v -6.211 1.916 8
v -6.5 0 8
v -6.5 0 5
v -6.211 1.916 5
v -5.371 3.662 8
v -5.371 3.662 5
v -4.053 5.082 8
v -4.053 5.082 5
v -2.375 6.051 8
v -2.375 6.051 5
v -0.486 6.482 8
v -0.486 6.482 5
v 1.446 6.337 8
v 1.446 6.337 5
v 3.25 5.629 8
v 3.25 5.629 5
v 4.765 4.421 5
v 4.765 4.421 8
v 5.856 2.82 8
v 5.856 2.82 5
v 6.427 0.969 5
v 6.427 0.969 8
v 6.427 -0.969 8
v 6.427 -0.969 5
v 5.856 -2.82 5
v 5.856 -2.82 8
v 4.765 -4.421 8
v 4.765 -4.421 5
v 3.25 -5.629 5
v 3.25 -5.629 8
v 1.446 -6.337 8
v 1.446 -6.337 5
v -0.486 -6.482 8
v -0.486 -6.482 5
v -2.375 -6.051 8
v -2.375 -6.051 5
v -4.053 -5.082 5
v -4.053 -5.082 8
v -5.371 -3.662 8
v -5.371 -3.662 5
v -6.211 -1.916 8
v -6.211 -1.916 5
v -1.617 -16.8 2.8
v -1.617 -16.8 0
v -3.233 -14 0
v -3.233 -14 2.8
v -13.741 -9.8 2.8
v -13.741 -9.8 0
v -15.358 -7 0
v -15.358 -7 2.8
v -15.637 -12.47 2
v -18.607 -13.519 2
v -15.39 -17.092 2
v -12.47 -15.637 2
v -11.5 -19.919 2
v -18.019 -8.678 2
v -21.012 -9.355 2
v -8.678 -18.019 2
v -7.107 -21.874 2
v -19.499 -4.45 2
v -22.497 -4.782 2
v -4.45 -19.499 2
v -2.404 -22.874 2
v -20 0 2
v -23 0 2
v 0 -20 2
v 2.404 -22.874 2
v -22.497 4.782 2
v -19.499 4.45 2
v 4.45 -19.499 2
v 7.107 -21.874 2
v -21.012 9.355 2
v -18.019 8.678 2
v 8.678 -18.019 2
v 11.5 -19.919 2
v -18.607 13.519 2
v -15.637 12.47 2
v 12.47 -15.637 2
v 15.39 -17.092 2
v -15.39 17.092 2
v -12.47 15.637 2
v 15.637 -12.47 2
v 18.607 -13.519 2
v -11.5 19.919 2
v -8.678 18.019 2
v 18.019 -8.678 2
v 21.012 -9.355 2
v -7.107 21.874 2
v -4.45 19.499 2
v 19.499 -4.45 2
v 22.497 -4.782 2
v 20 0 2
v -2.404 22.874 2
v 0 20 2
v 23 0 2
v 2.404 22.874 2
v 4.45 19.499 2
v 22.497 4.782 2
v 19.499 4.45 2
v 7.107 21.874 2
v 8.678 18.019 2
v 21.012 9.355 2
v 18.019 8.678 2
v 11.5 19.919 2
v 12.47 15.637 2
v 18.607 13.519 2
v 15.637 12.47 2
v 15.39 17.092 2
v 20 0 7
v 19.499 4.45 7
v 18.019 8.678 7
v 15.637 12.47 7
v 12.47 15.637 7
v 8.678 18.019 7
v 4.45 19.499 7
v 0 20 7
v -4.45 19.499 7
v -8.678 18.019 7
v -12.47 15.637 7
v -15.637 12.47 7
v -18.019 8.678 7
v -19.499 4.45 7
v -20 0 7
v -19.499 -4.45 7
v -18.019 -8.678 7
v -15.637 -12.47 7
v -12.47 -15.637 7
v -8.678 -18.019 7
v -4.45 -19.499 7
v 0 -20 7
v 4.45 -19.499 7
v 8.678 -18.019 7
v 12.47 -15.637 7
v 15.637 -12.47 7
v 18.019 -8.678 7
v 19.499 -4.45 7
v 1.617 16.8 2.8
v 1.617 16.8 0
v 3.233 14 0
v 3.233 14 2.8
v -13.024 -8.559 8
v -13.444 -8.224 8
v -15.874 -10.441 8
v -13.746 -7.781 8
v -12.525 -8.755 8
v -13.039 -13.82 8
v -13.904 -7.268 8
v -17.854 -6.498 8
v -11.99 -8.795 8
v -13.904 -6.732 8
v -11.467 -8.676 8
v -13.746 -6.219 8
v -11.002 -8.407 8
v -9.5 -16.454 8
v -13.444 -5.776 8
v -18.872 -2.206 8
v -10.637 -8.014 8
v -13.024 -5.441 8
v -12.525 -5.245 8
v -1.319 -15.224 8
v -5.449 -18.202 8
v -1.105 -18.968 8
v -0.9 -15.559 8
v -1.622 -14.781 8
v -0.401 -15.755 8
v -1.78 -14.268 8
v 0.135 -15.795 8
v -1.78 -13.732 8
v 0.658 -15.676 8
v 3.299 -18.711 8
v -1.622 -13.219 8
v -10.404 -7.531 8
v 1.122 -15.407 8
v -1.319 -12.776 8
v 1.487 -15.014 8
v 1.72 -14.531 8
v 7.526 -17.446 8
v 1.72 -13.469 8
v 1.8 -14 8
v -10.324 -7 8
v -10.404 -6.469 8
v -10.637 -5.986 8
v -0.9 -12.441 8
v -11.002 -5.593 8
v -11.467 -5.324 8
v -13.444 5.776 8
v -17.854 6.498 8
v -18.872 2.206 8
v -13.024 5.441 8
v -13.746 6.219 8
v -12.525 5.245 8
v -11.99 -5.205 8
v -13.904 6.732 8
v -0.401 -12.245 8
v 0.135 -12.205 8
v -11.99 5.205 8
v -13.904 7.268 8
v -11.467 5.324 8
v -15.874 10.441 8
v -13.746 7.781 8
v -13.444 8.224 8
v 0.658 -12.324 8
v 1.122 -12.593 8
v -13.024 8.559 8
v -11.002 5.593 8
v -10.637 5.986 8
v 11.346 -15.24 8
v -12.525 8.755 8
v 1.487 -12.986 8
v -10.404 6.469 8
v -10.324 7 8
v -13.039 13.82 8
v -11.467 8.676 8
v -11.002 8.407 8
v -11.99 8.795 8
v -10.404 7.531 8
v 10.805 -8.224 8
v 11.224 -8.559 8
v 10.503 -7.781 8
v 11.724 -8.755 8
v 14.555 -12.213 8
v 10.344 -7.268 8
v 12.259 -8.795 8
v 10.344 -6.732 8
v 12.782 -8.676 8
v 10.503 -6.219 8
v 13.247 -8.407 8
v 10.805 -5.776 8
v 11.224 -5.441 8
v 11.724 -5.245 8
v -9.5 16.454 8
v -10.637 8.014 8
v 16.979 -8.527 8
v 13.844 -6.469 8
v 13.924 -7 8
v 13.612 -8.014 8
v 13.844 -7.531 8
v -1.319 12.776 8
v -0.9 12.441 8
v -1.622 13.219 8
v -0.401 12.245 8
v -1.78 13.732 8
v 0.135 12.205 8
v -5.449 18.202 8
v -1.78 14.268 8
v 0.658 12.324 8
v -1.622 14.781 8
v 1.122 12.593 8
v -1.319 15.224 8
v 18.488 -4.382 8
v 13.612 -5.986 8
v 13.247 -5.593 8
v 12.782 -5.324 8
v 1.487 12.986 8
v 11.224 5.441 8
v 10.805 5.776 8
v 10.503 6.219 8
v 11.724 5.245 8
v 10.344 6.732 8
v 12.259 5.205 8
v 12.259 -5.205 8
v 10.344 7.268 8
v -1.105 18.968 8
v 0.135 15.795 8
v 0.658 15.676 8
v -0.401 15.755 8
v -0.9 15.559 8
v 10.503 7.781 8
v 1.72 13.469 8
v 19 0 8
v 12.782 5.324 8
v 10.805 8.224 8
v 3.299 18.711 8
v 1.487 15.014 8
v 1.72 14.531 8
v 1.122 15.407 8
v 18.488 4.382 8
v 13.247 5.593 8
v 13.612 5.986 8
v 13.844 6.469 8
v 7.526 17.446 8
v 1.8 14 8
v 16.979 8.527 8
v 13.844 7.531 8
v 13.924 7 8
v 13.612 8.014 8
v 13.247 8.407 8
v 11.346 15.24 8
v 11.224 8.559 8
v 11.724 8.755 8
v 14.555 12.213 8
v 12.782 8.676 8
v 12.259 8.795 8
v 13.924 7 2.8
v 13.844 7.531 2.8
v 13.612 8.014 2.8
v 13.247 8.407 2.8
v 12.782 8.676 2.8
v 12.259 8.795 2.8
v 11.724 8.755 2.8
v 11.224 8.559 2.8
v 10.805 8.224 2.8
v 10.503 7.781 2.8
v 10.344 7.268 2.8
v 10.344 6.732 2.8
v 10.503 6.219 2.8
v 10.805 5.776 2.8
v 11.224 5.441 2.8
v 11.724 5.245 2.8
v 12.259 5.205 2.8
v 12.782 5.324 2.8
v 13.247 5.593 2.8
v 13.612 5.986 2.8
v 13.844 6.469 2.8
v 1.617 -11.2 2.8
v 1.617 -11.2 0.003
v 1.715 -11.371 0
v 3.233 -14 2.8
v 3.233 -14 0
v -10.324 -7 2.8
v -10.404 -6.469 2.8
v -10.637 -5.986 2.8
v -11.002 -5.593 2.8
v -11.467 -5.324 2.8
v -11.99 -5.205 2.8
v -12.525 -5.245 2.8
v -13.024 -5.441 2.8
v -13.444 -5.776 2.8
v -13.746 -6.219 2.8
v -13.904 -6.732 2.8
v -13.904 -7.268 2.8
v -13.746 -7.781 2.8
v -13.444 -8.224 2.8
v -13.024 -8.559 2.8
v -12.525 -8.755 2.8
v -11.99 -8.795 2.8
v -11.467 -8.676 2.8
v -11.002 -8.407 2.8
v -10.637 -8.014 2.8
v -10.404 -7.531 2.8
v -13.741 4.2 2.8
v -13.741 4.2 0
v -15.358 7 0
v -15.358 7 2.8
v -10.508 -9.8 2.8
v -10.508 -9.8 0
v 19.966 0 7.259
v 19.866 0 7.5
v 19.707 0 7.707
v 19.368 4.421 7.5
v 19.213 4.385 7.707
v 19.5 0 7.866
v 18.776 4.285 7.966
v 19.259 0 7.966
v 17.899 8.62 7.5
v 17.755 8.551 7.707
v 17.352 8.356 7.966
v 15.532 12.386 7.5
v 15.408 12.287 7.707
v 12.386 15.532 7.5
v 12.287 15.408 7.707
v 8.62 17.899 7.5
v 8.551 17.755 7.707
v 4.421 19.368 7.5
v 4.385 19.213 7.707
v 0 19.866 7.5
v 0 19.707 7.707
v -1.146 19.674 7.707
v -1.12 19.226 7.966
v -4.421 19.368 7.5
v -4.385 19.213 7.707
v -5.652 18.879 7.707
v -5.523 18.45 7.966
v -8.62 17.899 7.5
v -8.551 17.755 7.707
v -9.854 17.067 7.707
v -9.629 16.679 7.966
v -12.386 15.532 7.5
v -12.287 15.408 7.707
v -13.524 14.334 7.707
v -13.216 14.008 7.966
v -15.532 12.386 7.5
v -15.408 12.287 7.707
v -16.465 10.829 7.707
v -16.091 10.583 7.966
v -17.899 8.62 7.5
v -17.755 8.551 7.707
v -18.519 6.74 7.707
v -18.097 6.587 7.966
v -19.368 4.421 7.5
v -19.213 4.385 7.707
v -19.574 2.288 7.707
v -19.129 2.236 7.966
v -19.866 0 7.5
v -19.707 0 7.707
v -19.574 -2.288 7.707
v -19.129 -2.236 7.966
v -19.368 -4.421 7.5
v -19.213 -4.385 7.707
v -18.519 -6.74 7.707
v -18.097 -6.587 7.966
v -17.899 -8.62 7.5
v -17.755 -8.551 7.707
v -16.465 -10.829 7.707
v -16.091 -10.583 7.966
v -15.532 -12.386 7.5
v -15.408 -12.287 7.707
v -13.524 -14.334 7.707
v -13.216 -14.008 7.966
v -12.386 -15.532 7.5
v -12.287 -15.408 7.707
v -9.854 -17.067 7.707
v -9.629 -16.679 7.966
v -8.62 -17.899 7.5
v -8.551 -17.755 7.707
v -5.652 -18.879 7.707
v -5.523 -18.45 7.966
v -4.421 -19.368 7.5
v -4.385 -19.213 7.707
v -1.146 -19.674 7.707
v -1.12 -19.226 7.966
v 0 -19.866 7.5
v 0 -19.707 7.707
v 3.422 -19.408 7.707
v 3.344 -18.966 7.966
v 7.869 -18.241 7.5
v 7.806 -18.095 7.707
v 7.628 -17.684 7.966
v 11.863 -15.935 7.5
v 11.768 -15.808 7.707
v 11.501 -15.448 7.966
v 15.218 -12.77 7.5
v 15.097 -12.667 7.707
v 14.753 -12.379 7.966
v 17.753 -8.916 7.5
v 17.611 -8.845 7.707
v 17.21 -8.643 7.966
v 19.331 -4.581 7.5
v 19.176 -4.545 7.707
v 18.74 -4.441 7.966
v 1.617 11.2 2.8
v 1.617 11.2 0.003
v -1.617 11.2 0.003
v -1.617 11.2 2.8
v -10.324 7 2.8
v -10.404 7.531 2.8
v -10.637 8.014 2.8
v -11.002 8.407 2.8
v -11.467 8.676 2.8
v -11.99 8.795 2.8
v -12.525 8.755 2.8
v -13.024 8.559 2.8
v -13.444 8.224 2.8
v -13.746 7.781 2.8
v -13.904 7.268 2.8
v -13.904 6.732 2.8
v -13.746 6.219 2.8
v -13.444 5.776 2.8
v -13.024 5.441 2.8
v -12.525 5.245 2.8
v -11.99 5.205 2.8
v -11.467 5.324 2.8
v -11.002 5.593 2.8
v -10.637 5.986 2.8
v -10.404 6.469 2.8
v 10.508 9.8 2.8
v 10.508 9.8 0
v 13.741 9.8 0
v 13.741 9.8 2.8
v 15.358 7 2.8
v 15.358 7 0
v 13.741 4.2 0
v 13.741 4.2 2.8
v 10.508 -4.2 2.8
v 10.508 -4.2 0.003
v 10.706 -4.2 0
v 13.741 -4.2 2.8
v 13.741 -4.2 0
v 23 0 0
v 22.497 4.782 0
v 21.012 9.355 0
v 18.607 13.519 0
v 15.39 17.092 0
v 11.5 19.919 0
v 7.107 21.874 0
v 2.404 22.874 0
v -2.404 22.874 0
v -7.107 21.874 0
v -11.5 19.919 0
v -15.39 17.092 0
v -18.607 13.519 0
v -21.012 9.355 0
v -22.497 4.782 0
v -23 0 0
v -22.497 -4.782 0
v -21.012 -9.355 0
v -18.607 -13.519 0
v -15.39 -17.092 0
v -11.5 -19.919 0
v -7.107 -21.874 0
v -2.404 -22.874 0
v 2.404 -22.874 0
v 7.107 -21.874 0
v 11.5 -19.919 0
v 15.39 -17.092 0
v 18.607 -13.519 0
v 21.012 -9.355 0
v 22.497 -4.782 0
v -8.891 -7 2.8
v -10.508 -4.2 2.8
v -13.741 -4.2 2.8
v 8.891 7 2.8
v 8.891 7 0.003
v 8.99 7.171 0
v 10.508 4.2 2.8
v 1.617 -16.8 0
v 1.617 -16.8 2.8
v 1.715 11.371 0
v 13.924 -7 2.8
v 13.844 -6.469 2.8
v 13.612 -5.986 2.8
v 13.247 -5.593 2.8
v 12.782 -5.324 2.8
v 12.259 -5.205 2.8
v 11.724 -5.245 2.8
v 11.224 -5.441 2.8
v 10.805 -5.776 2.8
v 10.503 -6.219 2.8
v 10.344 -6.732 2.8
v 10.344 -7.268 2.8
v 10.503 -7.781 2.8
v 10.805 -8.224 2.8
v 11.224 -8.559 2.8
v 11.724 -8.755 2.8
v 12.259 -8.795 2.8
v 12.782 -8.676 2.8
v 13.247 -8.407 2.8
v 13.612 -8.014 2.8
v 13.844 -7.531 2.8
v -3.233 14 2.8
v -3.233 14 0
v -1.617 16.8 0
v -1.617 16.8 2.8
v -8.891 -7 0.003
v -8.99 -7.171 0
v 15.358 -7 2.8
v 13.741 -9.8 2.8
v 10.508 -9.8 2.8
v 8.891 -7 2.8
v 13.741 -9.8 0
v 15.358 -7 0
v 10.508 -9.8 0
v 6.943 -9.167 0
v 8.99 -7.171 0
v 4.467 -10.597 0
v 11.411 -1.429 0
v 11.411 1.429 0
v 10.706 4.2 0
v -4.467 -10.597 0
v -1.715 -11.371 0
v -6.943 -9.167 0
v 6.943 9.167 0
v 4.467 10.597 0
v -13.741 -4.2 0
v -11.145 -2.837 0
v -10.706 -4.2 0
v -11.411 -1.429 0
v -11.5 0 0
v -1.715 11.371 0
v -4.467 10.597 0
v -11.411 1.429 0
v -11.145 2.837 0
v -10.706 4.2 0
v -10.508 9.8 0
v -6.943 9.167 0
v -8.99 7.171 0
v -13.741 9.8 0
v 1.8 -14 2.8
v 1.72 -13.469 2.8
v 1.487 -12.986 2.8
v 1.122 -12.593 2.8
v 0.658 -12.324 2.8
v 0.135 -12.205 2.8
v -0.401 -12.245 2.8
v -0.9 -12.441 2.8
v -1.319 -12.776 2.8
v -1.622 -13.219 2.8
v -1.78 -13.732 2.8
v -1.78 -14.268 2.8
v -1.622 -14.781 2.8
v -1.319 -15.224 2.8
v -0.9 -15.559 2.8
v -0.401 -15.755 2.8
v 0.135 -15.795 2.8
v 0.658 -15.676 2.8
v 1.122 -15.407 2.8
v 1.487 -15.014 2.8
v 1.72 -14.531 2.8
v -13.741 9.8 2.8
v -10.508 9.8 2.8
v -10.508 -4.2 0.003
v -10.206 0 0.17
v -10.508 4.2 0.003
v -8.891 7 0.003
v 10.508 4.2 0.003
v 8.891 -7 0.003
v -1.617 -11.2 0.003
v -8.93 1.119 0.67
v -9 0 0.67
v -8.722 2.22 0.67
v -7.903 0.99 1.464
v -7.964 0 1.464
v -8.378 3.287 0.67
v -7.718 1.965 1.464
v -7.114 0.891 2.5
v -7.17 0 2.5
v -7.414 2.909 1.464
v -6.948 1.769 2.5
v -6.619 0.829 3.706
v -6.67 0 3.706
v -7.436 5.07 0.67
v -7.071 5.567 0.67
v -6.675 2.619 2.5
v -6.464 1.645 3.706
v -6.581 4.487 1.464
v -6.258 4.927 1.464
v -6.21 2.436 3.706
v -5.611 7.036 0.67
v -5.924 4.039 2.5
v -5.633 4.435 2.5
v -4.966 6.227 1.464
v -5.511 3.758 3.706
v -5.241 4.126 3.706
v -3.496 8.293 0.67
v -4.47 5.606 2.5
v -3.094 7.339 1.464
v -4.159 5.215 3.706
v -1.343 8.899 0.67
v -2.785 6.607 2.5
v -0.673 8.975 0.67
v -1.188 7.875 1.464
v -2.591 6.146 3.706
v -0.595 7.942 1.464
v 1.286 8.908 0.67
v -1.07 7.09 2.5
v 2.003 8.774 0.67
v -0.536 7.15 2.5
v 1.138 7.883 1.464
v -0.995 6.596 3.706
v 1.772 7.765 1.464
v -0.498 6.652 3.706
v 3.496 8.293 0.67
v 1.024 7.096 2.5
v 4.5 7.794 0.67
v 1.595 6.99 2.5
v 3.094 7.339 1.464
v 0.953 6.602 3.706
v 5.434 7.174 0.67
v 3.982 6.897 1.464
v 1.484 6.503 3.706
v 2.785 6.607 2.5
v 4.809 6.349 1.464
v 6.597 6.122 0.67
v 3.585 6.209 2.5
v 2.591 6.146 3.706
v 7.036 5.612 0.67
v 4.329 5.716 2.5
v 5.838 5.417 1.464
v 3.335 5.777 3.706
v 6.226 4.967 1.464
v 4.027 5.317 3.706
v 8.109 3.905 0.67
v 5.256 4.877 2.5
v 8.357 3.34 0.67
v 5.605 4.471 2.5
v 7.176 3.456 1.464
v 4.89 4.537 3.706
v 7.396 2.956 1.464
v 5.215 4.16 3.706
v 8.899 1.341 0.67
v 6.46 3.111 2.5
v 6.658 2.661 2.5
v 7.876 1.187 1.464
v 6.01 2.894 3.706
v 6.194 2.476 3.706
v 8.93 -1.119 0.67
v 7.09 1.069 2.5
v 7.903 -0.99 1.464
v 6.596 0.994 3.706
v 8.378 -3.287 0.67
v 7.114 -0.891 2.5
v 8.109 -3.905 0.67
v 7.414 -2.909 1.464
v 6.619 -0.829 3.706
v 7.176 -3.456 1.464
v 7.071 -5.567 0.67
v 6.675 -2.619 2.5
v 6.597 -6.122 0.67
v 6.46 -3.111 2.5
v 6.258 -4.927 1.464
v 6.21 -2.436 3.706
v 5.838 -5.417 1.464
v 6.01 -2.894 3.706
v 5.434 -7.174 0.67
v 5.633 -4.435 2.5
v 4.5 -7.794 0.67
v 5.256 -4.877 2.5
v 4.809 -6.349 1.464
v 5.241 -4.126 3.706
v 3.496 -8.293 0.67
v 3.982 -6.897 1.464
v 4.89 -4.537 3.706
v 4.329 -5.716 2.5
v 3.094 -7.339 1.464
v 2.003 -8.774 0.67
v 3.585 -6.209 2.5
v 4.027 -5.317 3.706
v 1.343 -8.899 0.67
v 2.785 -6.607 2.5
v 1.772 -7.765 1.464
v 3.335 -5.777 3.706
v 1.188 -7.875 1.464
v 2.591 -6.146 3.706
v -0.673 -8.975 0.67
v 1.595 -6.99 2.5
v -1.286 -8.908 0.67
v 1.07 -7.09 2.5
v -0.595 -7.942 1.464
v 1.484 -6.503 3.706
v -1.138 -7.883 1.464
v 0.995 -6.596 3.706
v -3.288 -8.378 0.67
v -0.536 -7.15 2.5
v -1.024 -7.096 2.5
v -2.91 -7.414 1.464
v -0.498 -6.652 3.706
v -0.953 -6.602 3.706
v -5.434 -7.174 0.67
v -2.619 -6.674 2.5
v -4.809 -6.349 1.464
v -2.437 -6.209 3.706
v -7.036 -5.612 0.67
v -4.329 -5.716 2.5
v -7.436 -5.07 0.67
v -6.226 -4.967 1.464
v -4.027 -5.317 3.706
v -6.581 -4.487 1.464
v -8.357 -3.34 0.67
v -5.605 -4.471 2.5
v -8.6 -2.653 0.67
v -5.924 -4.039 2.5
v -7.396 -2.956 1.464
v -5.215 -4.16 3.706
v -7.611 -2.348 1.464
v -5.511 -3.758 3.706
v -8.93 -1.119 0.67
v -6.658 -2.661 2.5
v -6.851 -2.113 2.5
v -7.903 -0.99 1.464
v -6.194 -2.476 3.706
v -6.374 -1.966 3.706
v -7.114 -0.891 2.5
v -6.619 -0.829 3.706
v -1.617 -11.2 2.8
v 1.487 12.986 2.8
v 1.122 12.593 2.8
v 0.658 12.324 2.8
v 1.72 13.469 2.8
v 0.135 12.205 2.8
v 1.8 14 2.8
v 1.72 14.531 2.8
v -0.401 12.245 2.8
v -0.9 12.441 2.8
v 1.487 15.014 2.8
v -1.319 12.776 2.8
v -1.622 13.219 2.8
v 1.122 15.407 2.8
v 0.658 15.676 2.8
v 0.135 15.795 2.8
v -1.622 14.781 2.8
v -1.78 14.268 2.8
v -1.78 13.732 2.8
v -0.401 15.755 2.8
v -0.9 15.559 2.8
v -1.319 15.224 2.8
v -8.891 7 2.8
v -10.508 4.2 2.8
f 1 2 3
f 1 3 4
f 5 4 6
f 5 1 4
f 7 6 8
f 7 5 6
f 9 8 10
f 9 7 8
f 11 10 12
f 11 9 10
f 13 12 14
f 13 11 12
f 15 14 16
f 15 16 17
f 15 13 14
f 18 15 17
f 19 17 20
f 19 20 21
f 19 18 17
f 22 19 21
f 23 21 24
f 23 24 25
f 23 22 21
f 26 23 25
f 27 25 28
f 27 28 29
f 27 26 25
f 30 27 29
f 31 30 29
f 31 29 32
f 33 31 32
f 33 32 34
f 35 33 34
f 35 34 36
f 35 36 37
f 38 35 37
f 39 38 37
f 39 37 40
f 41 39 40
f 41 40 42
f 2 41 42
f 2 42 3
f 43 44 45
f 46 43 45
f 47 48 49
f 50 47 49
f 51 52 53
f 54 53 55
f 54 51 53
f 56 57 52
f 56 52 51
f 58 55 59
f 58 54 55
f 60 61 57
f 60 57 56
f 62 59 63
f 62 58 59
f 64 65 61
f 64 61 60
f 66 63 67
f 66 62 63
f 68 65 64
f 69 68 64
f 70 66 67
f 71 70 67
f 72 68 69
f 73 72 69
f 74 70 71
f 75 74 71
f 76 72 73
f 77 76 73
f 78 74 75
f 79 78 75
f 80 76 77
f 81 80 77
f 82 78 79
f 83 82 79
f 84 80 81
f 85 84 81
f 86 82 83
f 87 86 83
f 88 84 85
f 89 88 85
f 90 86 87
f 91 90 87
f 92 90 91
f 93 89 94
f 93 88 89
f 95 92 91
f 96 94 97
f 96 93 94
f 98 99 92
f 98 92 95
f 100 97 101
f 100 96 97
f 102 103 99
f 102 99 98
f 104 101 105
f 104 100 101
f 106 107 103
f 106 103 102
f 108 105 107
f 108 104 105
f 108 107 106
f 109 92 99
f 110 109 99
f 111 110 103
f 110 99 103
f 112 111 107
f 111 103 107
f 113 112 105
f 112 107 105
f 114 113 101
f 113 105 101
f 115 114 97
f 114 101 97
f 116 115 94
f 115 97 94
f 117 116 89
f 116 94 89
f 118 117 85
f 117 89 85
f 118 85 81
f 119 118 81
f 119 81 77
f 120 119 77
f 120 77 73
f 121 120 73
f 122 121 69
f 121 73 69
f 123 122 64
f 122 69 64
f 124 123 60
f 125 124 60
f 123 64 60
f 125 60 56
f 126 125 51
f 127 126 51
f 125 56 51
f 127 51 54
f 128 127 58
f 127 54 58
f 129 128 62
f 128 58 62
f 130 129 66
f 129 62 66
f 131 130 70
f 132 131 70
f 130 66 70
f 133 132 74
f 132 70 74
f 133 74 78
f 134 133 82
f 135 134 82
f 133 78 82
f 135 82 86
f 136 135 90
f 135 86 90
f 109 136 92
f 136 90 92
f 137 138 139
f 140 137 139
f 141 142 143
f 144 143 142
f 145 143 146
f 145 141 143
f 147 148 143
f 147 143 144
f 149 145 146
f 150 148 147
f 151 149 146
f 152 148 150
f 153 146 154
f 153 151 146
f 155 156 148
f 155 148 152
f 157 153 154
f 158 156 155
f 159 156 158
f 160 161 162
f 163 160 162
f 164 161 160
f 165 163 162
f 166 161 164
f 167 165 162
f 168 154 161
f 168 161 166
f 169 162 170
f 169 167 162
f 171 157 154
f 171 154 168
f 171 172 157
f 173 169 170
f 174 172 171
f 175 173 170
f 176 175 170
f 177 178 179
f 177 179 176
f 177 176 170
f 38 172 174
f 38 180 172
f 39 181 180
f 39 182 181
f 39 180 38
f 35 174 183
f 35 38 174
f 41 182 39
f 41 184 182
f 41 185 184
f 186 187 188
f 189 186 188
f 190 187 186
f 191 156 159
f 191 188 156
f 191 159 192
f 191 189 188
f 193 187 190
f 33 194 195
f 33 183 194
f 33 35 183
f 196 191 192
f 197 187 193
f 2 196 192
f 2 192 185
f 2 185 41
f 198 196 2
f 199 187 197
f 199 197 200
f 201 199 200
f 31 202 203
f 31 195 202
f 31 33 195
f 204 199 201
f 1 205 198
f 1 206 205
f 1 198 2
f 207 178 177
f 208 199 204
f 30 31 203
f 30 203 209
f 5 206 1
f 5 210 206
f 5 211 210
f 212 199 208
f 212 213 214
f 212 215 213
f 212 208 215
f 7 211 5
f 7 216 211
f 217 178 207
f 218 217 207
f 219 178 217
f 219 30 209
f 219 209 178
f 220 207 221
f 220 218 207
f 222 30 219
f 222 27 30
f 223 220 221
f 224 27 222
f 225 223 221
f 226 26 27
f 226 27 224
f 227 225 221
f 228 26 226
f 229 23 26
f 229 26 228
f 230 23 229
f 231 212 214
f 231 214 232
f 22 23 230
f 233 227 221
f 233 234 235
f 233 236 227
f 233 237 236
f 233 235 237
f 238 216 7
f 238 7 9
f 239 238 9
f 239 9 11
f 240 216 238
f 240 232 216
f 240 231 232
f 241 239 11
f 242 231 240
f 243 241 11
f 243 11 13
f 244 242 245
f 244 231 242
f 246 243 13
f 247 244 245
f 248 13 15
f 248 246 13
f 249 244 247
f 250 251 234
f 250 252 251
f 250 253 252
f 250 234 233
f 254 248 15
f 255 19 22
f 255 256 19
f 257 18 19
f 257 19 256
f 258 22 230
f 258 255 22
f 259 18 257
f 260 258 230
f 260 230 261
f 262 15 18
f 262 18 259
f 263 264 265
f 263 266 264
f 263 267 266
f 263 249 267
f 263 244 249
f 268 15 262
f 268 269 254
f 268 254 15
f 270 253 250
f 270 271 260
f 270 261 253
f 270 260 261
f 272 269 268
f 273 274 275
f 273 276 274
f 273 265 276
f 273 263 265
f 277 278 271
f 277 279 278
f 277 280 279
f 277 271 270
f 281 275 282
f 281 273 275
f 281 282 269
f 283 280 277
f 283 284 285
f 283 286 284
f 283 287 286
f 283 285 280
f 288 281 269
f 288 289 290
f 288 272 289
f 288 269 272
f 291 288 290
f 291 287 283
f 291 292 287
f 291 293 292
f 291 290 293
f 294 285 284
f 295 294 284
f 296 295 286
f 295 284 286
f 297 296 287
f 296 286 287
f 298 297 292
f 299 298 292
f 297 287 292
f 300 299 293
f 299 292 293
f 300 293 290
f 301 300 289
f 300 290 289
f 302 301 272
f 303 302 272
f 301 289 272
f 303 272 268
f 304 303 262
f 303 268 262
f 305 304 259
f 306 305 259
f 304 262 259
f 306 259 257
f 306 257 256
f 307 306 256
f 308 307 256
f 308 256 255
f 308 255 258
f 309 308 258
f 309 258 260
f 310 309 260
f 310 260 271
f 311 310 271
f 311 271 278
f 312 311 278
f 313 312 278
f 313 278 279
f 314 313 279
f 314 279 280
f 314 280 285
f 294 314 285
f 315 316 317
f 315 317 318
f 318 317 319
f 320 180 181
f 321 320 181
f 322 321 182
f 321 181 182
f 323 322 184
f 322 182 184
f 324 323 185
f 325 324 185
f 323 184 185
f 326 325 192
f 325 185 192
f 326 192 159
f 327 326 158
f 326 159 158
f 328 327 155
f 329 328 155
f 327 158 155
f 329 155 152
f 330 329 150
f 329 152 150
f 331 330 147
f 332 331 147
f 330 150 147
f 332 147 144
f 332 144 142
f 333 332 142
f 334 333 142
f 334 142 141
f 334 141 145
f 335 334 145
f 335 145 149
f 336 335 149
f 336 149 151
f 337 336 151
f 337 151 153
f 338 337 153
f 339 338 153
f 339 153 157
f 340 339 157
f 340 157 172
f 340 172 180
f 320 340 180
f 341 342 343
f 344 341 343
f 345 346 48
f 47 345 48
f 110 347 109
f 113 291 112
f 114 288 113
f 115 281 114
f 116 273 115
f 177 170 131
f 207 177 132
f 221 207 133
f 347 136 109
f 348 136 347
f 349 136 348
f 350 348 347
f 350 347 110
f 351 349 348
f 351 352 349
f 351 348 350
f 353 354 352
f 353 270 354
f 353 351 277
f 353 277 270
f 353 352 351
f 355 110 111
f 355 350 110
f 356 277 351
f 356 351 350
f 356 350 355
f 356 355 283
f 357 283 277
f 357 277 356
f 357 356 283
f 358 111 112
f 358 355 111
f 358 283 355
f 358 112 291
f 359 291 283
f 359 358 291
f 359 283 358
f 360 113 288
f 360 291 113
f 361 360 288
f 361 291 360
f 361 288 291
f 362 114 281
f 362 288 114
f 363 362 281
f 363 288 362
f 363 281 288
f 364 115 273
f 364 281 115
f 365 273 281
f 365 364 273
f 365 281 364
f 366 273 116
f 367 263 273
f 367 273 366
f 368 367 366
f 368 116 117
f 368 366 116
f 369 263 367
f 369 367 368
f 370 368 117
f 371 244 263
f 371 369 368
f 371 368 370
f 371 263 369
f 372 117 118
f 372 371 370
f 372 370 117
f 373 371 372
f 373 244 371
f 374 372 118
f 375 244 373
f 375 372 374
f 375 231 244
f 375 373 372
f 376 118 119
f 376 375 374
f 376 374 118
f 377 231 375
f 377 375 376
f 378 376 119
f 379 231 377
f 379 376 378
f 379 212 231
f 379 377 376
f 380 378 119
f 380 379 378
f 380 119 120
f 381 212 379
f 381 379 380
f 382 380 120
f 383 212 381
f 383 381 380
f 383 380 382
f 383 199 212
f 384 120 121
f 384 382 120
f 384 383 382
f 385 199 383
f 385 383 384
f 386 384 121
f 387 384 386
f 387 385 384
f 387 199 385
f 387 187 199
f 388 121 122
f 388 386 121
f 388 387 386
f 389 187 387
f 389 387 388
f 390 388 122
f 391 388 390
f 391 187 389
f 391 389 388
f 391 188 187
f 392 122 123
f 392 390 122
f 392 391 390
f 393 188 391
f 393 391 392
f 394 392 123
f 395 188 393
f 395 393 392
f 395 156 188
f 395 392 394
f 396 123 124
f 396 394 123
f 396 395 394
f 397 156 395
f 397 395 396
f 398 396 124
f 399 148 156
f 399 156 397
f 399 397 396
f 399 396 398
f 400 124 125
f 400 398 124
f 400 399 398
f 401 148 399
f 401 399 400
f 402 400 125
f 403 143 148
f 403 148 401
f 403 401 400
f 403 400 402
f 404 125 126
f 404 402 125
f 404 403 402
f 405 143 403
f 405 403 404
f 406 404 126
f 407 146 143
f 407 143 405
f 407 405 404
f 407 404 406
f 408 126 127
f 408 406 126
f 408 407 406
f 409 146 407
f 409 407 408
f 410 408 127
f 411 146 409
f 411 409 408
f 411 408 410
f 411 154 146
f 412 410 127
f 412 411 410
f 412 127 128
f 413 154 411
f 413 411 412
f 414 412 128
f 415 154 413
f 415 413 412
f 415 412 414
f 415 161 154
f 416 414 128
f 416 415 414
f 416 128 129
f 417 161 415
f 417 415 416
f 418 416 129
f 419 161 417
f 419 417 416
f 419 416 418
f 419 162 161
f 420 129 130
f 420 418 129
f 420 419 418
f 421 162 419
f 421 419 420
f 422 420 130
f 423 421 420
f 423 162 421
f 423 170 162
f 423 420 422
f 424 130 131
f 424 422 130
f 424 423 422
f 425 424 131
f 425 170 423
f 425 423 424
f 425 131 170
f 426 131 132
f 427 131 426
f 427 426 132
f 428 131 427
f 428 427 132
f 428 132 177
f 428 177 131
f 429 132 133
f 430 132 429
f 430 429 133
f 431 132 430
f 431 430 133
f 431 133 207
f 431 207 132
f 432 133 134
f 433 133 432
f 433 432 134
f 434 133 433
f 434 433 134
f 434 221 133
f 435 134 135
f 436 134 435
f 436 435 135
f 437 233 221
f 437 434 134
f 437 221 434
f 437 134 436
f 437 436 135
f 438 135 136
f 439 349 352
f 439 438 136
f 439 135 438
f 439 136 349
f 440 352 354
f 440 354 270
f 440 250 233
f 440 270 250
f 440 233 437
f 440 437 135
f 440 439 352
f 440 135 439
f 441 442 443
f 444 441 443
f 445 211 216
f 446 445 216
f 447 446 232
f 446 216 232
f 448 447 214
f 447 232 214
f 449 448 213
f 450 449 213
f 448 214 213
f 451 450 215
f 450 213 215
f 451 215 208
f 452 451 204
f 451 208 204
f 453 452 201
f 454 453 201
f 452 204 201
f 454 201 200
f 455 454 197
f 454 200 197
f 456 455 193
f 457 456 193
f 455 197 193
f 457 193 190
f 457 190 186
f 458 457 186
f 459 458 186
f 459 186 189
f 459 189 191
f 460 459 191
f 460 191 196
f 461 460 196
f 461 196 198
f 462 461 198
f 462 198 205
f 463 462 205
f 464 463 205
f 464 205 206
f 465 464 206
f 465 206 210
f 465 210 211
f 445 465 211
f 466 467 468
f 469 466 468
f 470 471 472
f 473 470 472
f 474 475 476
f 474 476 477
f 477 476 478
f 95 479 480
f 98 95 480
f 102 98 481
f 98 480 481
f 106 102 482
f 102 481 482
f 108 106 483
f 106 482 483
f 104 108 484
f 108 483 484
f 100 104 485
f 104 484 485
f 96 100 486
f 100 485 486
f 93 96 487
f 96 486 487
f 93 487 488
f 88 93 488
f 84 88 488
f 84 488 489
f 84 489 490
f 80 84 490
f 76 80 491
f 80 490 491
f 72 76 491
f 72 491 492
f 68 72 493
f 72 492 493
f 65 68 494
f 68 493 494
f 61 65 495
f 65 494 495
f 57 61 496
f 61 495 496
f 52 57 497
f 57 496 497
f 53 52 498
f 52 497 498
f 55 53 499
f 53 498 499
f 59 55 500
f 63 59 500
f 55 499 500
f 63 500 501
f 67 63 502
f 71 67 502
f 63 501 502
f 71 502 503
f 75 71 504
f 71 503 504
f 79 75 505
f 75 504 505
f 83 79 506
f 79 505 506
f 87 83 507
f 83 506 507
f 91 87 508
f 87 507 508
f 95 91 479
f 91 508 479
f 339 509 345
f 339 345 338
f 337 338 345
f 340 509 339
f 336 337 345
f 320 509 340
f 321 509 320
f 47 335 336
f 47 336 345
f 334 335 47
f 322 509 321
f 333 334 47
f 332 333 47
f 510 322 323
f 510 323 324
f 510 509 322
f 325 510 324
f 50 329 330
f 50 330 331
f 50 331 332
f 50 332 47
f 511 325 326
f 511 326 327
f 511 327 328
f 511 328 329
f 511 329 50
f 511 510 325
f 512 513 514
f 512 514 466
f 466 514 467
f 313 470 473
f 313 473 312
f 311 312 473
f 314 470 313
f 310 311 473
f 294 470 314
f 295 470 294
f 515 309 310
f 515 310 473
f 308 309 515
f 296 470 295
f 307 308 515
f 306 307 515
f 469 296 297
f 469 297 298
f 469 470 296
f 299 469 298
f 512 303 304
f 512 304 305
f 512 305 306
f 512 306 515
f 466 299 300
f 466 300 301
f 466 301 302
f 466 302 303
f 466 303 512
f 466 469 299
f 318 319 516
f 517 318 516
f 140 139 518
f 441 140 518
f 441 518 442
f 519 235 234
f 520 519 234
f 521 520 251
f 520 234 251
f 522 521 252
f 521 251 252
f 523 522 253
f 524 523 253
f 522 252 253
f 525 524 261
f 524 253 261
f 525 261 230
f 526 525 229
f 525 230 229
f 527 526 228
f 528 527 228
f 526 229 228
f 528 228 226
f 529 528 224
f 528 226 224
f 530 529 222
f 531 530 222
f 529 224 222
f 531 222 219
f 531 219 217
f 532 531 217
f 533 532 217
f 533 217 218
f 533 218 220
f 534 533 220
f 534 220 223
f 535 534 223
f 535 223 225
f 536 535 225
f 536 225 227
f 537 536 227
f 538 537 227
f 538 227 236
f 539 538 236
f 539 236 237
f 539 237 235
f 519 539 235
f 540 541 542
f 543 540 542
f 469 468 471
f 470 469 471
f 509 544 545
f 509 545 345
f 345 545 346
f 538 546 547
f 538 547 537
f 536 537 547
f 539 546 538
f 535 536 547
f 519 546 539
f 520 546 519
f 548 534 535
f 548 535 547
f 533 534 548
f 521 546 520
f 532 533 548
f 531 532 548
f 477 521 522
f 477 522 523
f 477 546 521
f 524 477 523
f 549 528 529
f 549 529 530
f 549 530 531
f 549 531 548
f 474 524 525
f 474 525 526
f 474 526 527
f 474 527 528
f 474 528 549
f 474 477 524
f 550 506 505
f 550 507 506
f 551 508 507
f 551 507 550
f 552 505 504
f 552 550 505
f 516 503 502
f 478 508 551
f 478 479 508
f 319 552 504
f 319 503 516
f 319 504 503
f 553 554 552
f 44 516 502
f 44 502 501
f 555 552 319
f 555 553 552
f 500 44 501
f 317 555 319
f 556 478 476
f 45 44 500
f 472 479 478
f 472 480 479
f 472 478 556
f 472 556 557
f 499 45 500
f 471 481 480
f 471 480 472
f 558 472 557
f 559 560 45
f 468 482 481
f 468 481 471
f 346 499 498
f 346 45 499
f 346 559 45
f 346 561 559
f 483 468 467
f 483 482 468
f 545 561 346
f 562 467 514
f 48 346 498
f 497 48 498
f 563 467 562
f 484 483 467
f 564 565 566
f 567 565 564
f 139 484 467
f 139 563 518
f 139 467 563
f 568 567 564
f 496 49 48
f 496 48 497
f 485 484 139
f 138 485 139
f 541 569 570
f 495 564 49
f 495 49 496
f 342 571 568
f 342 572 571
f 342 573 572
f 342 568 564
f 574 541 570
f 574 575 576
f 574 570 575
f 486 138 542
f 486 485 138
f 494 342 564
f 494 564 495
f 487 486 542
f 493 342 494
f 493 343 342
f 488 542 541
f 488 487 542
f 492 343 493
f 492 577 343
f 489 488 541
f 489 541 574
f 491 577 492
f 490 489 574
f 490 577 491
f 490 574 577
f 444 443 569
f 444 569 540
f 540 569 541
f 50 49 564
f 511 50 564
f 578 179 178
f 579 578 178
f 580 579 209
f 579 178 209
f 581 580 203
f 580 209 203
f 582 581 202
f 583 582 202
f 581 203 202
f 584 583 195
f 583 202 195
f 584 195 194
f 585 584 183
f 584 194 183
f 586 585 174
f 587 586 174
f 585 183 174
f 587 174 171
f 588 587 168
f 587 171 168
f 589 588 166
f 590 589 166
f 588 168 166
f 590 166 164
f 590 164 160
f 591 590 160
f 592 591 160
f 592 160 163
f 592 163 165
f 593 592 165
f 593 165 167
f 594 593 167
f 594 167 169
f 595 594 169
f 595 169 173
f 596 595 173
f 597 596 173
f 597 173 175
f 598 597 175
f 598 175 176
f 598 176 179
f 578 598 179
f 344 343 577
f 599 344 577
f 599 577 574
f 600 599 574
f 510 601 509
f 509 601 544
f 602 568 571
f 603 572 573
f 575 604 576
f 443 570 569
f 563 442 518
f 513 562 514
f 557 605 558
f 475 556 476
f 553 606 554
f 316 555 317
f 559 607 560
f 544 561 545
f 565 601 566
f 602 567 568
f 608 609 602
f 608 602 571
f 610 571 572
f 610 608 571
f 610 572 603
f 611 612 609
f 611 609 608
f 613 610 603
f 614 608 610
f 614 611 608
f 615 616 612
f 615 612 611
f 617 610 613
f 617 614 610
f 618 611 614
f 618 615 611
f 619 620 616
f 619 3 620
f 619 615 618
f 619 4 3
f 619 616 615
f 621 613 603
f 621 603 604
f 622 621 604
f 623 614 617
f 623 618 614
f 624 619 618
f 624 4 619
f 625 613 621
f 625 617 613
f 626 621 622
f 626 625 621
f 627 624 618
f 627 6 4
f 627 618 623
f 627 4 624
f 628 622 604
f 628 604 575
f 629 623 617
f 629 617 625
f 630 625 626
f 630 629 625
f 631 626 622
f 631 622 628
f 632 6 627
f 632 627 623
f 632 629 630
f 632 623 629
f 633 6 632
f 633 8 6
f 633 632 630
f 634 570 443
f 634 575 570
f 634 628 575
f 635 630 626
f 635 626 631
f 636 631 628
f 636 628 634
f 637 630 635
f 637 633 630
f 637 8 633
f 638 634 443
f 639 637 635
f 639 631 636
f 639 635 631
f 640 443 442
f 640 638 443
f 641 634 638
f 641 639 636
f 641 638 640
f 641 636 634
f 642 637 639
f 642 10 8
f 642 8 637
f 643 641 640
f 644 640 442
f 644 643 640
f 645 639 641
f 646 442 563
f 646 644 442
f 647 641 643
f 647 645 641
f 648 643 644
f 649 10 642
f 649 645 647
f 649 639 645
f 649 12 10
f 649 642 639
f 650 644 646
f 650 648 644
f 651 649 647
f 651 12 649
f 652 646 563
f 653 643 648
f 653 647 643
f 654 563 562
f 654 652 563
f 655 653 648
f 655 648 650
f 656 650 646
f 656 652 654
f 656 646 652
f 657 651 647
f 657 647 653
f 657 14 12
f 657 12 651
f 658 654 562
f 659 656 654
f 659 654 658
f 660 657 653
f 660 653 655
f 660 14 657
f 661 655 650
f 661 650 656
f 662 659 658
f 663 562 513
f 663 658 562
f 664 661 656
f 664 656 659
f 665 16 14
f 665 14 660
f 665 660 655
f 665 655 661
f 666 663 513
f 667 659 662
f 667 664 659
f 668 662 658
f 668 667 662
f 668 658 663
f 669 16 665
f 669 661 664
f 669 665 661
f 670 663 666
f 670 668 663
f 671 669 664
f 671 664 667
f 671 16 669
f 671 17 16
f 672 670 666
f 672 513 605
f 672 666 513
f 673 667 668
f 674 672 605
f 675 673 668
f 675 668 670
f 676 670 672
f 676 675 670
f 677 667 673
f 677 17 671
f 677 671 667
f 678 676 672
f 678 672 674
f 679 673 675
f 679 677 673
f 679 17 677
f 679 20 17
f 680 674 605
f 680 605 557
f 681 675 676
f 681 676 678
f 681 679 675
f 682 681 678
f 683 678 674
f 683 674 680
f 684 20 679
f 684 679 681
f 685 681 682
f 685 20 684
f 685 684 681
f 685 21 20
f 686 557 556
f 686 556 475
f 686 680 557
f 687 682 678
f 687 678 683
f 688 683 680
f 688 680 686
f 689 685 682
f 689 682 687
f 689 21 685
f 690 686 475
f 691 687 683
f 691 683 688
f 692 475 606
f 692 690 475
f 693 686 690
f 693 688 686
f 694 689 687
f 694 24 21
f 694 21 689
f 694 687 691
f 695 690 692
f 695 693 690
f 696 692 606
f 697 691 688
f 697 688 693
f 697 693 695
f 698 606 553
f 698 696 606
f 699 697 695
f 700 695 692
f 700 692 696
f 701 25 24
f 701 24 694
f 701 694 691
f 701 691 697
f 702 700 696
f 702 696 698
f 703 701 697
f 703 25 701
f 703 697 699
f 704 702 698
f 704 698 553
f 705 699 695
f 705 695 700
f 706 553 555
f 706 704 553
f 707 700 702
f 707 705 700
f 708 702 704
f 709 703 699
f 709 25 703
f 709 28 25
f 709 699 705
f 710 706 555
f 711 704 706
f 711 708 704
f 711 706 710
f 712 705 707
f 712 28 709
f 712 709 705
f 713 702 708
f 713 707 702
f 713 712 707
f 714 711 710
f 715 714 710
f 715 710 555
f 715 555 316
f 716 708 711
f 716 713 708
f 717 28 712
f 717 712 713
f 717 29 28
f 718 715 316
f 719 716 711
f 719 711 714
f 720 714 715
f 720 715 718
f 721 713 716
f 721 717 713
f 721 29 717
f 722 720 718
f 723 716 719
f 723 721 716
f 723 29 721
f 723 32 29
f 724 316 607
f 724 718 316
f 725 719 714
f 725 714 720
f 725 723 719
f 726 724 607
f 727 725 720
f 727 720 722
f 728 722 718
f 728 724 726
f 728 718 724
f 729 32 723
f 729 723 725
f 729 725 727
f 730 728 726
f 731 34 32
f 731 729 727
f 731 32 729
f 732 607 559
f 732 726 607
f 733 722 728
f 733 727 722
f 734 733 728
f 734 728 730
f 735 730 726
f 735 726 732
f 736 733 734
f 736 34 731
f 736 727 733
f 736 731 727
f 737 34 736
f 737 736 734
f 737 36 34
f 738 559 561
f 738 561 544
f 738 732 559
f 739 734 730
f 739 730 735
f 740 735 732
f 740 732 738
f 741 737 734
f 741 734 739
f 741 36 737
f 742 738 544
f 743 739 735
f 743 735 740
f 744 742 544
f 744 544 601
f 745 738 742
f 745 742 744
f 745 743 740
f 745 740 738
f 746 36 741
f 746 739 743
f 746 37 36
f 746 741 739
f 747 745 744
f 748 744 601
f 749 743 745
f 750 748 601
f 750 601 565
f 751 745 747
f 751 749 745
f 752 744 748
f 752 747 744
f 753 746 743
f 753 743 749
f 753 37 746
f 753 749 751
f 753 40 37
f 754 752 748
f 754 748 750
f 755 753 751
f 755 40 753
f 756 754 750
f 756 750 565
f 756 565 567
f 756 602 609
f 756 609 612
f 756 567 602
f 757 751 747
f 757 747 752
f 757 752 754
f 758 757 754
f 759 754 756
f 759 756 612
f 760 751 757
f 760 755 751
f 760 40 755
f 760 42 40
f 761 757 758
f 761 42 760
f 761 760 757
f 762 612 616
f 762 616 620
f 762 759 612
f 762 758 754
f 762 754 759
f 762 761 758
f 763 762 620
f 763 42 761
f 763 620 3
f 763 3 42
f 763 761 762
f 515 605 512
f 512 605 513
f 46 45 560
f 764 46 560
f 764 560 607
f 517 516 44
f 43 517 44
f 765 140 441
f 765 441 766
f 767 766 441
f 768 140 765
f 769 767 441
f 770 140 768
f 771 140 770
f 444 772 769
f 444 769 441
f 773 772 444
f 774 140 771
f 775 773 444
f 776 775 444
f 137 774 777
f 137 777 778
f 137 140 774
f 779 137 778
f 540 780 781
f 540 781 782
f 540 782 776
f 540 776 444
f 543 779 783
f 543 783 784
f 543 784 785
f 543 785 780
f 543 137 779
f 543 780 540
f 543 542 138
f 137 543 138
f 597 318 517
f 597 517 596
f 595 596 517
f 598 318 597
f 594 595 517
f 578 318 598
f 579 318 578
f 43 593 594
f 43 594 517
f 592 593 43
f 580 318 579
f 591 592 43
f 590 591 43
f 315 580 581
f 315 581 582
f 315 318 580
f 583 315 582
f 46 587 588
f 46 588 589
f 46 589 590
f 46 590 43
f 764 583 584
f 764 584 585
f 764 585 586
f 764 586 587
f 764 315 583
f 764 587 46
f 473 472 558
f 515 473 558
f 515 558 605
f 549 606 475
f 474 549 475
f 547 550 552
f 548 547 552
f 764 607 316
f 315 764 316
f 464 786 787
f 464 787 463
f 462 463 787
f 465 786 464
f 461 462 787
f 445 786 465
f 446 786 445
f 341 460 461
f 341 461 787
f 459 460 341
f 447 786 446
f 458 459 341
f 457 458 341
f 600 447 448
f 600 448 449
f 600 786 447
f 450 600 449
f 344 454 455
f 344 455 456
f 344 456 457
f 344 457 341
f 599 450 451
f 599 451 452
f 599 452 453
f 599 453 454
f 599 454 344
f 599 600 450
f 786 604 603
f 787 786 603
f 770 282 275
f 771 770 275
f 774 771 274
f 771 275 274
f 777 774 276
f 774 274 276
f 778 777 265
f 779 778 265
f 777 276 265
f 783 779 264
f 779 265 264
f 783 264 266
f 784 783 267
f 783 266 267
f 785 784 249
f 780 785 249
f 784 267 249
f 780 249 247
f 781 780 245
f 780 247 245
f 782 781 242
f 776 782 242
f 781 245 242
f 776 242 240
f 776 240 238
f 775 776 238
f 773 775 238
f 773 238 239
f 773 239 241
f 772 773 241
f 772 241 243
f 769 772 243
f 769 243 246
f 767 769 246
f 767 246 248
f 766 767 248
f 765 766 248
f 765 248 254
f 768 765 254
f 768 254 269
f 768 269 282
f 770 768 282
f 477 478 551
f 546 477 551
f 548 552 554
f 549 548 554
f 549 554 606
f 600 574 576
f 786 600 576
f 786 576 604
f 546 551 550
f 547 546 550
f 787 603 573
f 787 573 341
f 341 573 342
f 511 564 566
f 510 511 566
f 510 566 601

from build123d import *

# Parameters (mm, degrees)
SKETCH_1_R          = 23
EXTRUDE_1_DEPTH     = 2
SKETCH_2_R          = 20
EXTRUDE_2_DEPTH     = 6
SKETCH_3_R          = 1.8
CUT_EXTRUDE_1_DEPTH = 34.496268449
SKETCH_4_R          = 10
CUT_EXTRUDE_2_DEPTH = 34.496268449
FILLET_1_R          = 1
CUT_EXTRUDE_5_DEPTH = 2.8
EXTRUDE_START       = -11
SKETCH_9_R          = 10
SKETCH_9_R_2        = 6.5
EXTRUDE_3_DEPTH     = 11
SKETCH_10_R         = 10
SKETCH_10_R_2       = 8.5
CUT_EXTRUDE_6_DEPTH = 3
FILLET_3_R          = 1.5
FILLET_4_R          = 5
SKETCH_11_R         = 8.5
CUT_EXTRUDE_7_DEPTH = 34.496268473


with BuildPart() as part:
    # 草图1 → 凸台-拉伸1 (new body)
    with BuildSketch(Plane.XY):
        Circle(SKETCH_1_R)
    extrude(amount=EXTRUDE_1_DEPTH)

    # 草图2 → 凸台-拉伸2 (add)
    with BuildSketch(Plane.XY.offset(2)):
        Circle(SKETCH_2_R)
    extrude(amount=EXTRUDE_2_DEPTH)

    # 草图3 → 切除-拉伸1 (cut, through all)
    with BuildSketch(Plane.XY.offset(8)):
        with Locations((0, 14)):
            Circle(SKETCH_3_R)
        with Locations((12.124355653, 7)):
            Circle(SKETCH_3_R)
        with Locations((12.124355653, -7)):
            Circle(SKETCH_3_R)
        with Locations((0, -14)):
            Circle(SKETCH_3_R)
        with Locations((-12.124355653, -7)):
            Circle(SKETCH_3_R)
        with Locations((-12.124355653, 7)):
            Circle(SKETCH_3_R)
    extrude(amount=-CUT_EXTRUDE_1_DEPTH, mode=Mode.SUBTRACT)

    # 草图4 → 切除-拉伸2 (cut, through all)
    with BuildSketch(Plane.XY.offset(8)):
        Circle(SKETCH_4_R)
    extrude(amount=-CUT_EXTRUDE_2_DEPTH, mode=Mode.SUBTRACT)

    # 圆角1
    fillet_1_edges = [part.edges().sort_by_distance(p)[0] for p in [
        (-20, 0, 8),
    ]]
    fillet(fillet_1_edges, radius=FILLET_1_R)

    # 草图8 → 切除-拉伸5 (cut)
    with BuildSketch(Plane(origin=(0, 0, 0), x_dir=(-1, 0, 0), z_dir=(0, 0, -1))):
        Polygon((-10.507774899, 9.8), (-13.740936407, 9.8), (-15.35751716, 7), (-13.740936407, 4.2), (-10.507774899, 4.2), (-8.891194146, 7), align=None)
        Polygon((3.233161507, 14), (1.616580754, 16.8), (-1.616580754, 16.8), (-3.233161507, 14), (-1.616580754, 11.2), (1.616580754, 11.2), align=None)
        Polygon((13.740936407, 4.2), (15.35751716, 7), (13.740936407, 9.8), (10.507774899, 9.8), (8.891194146, 7), (10.507774899, 4.2), align=None)
        Polygon((10.507774899, -9.8), (13.740936407, -9.8), (15.35751716, -7), (13.740936407, -4.2), (10.507774899, -4.2), (8.891194146, -7), align=None)
        Polygon((-3.233161507, -14), (-1.616580754, -16.8), (1.616580754, -16.8), (3.233161507, -14), (1.616580754, -11.2), (-1.616580754, -11.2), align=None)
        Polygon((-13.740936407, -4.2), (-15.35751716, -7), (-13.740936407, -9.8), (-10.507774899, -9.8), (-8.891194146, -7), (-10.507774899, -4.2), align=None)
    extrude(amount=-CUT_EXTRUDE_5_DEPTH, mode=Mode.SUBTRACT)

    # 草图9 → 凸台-拉伸3 (add)
    with BuildSketch(Plane(origin=(0, 0, 0), x_dir=(-1, 0, 0), z_dir=(0, 0, -1)).offset(EXTRUDE_START)):
        Circle(SKETCH_9_R)
        Circle(SKETCH_9_R_2, mode=Mode.SUBTRACT)
    extrude(amount=EXTRUDE_3_DEPTH)

    # 草图10 → 切除-拉伸6 (cut)
    with BuildSketch(Plane.XY.offset(11)):
        Circle(SKETCH_10_R)
        Circle(SKETCH_10_R_2, mode=Mode.SUBTRACT)
    extrude(amount=-CUT_EXTRUDE_6_DEPTH, mode=Mode.SUBTRACT)

    # 圆角3
    fillet_3_edges = [part.edges().sort_by_distance(p)[0] for p in [
        (-8.5, 0, 11),
    ]]
    fillet(fillet_3_edges, radius=FILLET_3_R)

    # 圆角4
    # the kernel refuses this fillet: 5 mm, written as the material it takes off along each edge
    with BuildSketch(Plane(origin=(0, 0, 0), x_dir=(-1, 0, 0), z_dir=(0, -1, 0))) as fillet_4_piece_1:
        with BuildLine():
            CenterArc((6.5 + FILLET_4_R, -FILLET_4_R), FILLET_4_R, 90, 90)
            Line((6.5 + FILLET_4_R, 0), (6.5, 0))
            Line((6.5, 0), (6.5, -FILLET_4_R))
        make_face()
    revolve(axis=Axis((0, 0, 0), (0, 0, -1)), mode=Mode.SUBTRACT)

    # 草图11 → 切除-拉伸7 (cut, through all)
    with BuildSketch(Plane.XY.offset(8)):
        Circle(SKETCH_11_R)
    extrude(amount=CUT_EXTRUDE_7_DEPTH, mode=Mode.SUBTRACT)


solid = part.part
